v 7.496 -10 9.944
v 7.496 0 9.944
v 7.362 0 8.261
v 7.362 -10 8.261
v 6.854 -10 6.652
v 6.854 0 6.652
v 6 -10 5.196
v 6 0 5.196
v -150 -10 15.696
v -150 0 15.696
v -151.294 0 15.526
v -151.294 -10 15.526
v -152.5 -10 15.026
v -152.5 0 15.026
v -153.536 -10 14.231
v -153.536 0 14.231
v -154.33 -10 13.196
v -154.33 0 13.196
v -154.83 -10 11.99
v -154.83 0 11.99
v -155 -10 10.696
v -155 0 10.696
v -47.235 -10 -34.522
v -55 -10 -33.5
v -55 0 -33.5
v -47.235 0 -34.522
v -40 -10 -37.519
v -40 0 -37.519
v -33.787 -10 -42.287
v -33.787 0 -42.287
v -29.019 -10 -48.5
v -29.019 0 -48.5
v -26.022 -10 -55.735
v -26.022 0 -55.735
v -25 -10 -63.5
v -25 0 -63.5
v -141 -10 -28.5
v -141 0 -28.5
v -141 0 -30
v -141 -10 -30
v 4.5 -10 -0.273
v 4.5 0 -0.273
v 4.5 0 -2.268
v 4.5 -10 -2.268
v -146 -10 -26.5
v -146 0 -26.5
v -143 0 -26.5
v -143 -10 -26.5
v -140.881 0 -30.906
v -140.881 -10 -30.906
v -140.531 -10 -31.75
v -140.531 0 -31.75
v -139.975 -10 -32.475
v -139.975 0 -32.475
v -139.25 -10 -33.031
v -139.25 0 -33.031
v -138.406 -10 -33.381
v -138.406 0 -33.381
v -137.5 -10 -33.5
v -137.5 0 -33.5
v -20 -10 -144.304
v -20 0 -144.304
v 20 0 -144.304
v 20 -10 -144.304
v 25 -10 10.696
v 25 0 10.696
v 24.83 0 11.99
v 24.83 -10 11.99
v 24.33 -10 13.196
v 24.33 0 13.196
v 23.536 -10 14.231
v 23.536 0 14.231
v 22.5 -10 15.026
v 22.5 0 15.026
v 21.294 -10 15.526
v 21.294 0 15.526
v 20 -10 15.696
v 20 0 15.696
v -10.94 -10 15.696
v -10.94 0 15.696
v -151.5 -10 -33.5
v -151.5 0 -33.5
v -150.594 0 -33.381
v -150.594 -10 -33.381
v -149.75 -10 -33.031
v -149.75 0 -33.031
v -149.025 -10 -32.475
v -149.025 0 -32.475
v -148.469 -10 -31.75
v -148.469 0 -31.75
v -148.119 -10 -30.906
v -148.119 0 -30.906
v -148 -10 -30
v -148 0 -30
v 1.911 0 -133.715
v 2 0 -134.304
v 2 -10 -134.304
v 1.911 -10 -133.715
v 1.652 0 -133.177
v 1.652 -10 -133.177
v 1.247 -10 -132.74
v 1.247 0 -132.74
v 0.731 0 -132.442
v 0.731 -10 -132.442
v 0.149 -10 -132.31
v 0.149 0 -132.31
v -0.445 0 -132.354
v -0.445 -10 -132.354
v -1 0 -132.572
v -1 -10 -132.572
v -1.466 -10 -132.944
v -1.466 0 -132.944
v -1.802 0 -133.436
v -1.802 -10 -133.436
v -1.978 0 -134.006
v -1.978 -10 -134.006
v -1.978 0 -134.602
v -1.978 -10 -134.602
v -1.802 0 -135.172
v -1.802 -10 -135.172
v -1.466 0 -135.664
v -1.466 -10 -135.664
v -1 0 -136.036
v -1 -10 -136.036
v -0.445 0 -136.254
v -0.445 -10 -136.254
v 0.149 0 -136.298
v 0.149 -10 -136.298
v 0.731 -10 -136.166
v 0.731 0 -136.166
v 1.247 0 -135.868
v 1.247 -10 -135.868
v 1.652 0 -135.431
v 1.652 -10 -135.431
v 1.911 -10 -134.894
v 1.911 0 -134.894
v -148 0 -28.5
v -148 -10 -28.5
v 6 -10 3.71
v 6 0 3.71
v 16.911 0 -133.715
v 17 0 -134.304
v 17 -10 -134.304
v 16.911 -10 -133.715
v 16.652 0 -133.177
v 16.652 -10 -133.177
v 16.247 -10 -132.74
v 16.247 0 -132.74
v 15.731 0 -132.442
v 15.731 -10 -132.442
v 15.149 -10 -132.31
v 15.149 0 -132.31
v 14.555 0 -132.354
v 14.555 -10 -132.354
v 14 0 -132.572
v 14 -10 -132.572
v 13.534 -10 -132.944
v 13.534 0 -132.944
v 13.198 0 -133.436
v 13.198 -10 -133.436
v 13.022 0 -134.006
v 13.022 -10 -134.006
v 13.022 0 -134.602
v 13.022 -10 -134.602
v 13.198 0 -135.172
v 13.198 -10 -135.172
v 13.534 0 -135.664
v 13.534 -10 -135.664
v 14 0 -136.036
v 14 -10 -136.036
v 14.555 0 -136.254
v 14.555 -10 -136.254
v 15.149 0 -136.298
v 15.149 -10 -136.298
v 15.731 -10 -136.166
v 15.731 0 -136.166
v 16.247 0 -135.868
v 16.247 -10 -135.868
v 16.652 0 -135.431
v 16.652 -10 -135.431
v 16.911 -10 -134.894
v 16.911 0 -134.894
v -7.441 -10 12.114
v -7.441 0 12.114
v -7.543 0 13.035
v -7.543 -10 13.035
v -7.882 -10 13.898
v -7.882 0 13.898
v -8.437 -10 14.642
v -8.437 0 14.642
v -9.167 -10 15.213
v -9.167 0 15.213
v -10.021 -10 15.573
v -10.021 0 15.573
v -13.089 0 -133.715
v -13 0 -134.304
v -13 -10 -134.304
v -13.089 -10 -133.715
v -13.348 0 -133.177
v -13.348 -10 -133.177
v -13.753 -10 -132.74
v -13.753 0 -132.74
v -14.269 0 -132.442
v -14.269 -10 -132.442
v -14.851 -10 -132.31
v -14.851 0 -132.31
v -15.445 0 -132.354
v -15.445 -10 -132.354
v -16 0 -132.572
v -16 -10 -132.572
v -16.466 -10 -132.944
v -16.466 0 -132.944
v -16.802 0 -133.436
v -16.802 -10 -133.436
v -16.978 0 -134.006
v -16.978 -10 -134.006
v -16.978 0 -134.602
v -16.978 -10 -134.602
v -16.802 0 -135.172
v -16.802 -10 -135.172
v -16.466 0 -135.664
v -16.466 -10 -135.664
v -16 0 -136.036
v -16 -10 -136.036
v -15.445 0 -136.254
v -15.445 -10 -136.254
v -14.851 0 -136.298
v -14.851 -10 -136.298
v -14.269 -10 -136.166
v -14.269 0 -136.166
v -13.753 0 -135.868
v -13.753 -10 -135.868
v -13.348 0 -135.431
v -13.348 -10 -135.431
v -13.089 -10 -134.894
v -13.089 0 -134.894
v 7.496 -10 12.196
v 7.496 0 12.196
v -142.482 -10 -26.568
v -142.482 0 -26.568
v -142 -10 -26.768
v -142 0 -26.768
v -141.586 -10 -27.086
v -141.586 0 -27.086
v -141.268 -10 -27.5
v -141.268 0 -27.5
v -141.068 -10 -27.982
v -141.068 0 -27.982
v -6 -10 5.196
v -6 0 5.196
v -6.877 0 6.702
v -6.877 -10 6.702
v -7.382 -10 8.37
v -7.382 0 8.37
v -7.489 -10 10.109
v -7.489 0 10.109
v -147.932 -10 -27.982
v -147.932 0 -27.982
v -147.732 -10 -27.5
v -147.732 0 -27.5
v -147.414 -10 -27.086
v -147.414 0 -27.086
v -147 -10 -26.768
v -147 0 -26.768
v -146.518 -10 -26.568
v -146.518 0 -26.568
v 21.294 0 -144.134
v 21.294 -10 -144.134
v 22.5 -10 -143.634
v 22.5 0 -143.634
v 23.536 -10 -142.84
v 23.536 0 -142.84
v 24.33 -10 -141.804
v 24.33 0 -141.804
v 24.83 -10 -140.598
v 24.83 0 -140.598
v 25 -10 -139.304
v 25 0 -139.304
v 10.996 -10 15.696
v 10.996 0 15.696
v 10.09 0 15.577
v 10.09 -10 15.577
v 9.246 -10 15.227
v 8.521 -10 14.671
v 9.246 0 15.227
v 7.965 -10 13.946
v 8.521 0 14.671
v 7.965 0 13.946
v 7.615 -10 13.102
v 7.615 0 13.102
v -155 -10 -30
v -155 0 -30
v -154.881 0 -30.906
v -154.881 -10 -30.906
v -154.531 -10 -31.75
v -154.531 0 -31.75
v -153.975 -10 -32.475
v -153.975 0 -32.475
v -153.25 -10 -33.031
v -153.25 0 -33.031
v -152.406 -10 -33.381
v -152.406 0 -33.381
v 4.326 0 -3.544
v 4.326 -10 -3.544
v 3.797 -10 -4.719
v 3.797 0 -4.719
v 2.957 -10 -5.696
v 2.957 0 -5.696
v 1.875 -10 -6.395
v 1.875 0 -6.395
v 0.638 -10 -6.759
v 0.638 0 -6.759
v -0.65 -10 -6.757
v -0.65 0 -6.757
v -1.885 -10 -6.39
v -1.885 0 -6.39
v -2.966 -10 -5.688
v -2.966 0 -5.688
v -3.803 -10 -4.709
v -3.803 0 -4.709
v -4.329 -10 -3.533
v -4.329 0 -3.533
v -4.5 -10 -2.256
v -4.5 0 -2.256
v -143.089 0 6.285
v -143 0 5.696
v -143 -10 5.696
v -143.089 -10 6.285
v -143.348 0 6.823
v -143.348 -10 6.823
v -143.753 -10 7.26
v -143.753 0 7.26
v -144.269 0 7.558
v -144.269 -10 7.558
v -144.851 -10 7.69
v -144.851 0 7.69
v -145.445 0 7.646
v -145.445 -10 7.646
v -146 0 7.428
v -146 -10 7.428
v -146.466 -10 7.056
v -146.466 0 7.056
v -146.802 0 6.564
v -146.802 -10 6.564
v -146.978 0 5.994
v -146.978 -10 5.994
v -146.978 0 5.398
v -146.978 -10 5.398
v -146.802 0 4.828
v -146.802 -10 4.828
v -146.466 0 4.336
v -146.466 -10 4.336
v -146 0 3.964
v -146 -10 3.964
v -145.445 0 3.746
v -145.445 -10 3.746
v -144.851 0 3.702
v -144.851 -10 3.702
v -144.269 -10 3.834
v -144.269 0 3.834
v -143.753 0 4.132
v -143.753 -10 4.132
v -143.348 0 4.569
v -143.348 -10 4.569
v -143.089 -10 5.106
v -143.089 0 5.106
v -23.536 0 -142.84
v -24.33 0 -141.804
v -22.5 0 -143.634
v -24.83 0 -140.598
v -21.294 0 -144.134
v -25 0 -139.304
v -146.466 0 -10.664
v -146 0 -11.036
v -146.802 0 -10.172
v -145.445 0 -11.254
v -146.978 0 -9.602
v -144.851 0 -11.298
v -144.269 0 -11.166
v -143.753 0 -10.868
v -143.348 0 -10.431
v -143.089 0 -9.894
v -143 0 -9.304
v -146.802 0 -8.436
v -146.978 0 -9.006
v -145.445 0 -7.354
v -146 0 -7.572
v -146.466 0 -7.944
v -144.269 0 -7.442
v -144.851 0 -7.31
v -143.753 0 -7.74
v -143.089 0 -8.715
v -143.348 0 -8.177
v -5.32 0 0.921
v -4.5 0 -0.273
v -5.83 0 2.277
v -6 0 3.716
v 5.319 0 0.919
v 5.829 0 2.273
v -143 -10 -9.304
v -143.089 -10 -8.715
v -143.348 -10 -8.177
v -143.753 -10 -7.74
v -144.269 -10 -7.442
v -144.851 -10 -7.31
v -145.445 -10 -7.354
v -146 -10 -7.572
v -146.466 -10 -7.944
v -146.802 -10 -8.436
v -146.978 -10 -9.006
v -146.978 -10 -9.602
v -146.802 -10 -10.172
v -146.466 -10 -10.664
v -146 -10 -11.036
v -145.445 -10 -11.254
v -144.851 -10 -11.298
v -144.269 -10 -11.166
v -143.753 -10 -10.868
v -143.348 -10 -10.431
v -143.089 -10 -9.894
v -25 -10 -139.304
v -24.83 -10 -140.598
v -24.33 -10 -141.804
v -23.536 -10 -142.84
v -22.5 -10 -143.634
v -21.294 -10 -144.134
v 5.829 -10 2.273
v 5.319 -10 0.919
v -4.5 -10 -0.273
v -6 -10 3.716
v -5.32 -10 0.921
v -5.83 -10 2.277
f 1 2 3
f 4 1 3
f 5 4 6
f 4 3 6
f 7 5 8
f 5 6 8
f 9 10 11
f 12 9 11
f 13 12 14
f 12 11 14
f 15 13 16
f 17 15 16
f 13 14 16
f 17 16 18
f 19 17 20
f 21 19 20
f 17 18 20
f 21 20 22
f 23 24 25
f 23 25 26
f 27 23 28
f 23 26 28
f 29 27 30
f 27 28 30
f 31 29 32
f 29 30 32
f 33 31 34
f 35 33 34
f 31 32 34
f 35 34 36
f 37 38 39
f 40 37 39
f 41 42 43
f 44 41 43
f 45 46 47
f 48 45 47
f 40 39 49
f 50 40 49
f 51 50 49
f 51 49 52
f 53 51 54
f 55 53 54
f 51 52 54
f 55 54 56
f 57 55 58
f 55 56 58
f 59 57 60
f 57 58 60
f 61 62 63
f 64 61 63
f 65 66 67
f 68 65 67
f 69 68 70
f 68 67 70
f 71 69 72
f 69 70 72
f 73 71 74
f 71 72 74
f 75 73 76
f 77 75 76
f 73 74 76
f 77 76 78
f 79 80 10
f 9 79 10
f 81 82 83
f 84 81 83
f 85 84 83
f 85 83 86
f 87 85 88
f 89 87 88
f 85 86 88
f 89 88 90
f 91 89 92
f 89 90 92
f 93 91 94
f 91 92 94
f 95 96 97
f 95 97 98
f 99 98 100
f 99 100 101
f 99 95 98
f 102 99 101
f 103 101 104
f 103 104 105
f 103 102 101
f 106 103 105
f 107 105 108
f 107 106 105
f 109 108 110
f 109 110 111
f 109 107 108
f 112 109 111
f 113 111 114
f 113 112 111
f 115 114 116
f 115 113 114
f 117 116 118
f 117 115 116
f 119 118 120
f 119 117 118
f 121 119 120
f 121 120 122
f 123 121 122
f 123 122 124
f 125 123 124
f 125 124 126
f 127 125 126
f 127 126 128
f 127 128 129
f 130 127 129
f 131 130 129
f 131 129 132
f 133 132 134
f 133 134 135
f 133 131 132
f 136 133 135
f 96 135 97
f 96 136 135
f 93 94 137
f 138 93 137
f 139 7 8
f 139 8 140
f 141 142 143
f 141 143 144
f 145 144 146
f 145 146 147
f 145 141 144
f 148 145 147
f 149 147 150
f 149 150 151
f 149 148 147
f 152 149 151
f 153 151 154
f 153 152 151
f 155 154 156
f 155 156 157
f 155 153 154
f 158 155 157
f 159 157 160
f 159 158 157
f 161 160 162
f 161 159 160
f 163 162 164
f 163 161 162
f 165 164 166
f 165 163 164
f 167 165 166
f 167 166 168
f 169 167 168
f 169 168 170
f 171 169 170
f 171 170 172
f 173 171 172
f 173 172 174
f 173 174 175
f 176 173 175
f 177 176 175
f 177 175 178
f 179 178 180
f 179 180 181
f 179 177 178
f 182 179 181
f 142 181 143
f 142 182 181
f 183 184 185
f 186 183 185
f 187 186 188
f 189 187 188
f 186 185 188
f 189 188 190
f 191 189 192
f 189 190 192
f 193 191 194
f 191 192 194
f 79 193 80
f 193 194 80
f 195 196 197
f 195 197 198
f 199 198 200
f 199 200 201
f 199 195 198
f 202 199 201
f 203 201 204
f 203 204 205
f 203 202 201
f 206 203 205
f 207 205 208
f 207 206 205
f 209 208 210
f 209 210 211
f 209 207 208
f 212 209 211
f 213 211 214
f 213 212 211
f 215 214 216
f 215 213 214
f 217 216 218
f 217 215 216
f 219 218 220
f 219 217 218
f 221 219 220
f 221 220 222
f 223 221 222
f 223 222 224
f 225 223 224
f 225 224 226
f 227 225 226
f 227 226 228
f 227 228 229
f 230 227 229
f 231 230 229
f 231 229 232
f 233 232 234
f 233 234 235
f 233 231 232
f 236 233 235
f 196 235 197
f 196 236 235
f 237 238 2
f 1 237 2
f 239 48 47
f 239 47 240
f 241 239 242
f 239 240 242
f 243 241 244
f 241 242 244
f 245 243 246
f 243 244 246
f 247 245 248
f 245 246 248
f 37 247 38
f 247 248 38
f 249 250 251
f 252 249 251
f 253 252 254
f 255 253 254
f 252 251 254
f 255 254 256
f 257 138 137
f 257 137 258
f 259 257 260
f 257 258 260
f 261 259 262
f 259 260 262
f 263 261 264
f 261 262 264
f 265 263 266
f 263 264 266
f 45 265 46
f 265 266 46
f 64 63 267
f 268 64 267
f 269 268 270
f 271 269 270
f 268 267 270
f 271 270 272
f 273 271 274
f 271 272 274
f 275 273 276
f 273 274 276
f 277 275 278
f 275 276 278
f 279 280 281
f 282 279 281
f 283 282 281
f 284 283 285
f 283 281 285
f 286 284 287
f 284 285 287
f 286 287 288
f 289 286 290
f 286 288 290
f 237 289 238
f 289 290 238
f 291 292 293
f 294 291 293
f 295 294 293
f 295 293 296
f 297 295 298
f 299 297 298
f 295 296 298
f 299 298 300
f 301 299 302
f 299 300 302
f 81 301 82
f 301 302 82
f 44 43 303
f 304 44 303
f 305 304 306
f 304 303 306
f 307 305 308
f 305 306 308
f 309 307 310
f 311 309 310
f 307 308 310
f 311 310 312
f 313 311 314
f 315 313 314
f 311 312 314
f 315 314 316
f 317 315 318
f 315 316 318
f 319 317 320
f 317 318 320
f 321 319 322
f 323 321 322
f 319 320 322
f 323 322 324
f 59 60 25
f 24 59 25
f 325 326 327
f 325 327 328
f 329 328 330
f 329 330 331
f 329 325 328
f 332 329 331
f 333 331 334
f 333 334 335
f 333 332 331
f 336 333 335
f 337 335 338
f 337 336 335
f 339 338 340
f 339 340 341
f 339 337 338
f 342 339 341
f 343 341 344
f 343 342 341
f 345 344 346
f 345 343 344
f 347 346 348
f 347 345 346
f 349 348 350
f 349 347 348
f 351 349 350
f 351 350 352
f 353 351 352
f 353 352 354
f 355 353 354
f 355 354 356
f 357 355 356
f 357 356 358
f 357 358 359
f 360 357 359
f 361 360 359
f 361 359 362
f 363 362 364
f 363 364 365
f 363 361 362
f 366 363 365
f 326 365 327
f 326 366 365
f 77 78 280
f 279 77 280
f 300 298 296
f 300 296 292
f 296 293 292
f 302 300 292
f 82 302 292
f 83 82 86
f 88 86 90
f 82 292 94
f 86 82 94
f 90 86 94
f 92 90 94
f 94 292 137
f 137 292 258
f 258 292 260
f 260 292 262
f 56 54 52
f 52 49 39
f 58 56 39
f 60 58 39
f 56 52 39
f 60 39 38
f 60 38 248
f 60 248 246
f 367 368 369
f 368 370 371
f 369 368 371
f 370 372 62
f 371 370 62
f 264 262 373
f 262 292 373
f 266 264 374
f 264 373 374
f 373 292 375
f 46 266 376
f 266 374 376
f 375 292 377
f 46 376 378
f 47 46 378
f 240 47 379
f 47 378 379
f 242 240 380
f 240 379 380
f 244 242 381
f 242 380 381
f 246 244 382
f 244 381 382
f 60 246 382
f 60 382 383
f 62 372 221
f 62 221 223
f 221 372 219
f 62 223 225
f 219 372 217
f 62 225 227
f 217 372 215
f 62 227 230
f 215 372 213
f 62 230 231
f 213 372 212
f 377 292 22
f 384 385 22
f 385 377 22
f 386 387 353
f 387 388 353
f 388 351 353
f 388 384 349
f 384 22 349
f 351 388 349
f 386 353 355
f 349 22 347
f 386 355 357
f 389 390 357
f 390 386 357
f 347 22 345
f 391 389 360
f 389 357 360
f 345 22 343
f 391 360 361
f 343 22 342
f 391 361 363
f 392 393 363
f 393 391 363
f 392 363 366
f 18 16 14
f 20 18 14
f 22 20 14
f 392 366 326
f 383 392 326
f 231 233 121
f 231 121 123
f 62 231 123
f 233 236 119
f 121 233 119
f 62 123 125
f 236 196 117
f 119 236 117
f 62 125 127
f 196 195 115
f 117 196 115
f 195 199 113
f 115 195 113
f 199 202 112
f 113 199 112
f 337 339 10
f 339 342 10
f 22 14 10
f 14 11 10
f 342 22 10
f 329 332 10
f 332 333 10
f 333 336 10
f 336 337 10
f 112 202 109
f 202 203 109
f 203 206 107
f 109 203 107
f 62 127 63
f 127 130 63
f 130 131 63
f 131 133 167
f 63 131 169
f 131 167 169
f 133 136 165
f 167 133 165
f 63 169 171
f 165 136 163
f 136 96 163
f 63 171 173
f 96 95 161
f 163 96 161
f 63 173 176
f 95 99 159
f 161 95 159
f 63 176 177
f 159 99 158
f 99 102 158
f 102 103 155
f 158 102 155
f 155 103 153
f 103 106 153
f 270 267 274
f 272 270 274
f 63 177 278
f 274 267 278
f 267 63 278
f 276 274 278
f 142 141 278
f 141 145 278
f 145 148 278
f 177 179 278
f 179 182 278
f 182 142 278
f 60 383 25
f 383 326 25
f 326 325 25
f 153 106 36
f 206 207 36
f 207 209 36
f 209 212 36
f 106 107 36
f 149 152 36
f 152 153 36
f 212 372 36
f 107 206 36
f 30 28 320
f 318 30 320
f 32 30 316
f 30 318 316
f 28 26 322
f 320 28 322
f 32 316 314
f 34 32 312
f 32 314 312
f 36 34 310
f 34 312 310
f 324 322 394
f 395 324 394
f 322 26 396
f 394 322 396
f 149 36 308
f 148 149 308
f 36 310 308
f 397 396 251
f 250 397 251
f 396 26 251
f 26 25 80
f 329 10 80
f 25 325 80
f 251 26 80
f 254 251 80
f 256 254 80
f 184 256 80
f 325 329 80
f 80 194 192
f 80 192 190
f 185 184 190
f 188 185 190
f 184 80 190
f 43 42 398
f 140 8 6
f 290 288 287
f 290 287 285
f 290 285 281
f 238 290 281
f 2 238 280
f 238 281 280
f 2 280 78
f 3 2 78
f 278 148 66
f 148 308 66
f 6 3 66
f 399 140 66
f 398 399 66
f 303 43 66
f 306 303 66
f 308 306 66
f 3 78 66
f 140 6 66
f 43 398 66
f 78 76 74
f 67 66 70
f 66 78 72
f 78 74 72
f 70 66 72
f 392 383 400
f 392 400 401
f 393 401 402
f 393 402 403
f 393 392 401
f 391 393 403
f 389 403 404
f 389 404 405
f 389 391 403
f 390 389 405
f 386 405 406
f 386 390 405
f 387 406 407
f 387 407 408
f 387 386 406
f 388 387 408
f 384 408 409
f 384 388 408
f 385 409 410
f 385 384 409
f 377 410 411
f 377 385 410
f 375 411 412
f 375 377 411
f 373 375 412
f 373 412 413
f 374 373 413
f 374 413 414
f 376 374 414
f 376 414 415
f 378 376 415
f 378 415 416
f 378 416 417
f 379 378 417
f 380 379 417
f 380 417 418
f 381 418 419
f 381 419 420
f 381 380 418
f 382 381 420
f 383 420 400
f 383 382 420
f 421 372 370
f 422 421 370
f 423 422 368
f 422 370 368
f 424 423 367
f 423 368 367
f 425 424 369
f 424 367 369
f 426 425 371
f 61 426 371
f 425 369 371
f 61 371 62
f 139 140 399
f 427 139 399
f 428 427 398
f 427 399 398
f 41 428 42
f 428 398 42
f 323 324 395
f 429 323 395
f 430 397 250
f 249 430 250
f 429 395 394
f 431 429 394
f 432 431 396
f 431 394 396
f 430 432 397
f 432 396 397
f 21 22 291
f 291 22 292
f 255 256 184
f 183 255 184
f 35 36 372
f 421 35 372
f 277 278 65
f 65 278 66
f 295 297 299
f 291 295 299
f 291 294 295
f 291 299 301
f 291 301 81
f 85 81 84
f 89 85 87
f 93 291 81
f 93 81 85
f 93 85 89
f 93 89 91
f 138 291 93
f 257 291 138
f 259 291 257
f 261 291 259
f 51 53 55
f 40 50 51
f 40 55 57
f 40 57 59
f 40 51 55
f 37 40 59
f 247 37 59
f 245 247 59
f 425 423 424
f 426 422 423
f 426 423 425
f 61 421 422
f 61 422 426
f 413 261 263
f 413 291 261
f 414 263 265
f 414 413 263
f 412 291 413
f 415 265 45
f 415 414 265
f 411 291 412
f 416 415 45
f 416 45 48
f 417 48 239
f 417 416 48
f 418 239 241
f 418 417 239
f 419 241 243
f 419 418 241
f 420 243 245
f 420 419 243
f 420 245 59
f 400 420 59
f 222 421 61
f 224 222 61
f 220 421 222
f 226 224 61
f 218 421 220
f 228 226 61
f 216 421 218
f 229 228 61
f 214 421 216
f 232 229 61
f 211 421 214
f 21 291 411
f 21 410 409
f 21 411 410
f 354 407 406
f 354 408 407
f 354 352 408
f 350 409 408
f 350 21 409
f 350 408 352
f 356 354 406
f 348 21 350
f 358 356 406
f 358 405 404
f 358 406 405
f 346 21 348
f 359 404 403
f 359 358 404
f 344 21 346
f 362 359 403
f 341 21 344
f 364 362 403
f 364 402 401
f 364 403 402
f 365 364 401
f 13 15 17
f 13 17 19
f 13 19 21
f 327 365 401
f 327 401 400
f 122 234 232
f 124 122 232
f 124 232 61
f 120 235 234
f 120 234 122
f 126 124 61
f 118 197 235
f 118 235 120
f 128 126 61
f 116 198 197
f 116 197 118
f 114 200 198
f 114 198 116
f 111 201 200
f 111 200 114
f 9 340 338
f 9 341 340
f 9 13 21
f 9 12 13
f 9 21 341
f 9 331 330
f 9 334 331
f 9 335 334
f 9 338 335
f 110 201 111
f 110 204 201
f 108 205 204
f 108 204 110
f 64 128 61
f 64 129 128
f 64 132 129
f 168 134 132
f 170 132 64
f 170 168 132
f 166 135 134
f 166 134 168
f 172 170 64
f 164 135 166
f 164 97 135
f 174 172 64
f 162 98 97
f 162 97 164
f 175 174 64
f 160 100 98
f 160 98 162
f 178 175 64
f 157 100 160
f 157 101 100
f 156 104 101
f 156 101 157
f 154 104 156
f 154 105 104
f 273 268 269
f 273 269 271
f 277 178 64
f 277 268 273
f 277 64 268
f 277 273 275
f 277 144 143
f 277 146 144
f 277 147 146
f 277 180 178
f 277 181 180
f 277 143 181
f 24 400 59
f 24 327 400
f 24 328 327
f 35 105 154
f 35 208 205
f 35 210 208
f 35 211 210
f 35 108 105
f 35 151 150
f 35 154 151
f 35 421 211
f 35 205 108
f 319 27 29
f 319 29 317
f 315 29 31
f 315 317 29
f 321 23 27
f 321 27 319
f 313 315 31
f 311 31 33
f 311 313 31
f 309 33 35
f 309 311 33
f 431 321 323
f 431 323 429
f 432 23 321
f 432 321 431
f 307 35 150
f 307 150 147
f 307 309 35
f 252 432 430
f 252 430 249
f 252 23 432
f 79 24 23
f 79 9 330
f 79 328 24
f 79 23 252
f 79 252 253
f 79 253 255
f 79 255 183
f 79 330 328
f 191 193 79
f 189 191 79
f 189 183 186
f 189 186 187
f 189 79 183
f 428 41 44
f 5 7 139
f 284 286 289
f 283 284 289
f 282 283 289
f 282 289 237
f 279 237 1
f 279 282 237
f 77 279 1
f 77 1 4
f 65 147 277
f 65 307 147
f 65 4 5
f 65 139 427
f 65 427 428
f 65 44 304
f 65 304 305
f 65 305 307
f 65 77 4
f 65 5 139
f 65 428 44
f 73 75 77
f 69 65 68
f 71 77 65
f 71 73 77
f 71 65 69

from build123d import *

# Parameters (mm, degrees)
F0_R     = 2
F1_DEPTH = 10


with BuildPart() as f1:
    # F0 (on Front) → F1 (new body)
    with BuildSketch(Plane.XZ):
        with BuildLine():
            ThreePointArc((-141, -30), (-139.974874, -32.474874), (-137.5, -33.5))
            Line((-137.5, -33.5), (-55, -33.5))
            ThreePointArc((-55, -33.5), (-33.786797, -42.286797), (-25, -63.5))
            Line((-25, -63.5), (-25, -139.304042))
            ThreePointArc((-25, -139.304042), (-23.535534, -142.839575), (-20, -144.304042))
            Line((-20, -144.304042), (20, -144.304042))
            ThreePointArc((20, -144.304042), (23.535534, -142.839575), (25, -139.304042))
            Line((25, -139.304042), (25, 10.695958))
            ThreePointArc((25, 10.695958), (23.535534, 14.231492), (20, 15.695958))
            Line((20, 15.695958), (10.995904, 15.695958))
            ThreePointArc((10.995904, 15.695958), (8.52103, 14.670832), (7.495904, 12.195958))
            Line((7.495904, 12.195958), (7.495904, 9.943808))
            ThreePointArc((7.495904, 9.943808), (7.153343, 7.442143), (5.999985, 5.195938))
            Line((5.999985, 5.195938), (5.999985, 3.709538))
            ThreePointArc((5.999985, 3.709538), (5.614844, 1.580886), (4.499852, -0.272836))
            Line((4.499852, -0.272836), (4.499852, -2.267552))
            ThreePointArc((4.499852, -2.267552), (-0.005832, -6.804038), (-4.499742, -2.255887))
            Line((-4.499742, -2.255887), (-4.499742, -0.272961))
            ThreePointArc((-4.499742, -0.272961), (-5.616003, 1.583966), (-5.999966, 3.716286))
            Line((-5.999966, 3.716286), (-5.999966, 5.195912))
            ThreePointArc((-5.999966, 5.195912), (-7.177791, 7.521258), (-7.488602, 10.109288))
            Line((-7.488602, 10.109288), (-7.441414, 12.113578))
            ThreePointArc((-7.441414, 12.113578), (-8.436614, 14.641533), (-10.940444, 15.695958))
            Line((-10.940444, 15.695958), (-150, 15.695958))
            ThreePointArc((-150, 15.695958), (-153.535534, 14.231492), (-155, 10.695958))
            Line((-155, 10.695958), (-155, -30))
            ThreePointArc((-155, -30), (-153.974874, -32.474874), (-151.5, -33.5))
            ThreePointArc((-151.5, -33.5), (-149.025126, -32.474874), (-148, -30))
            Line((-148, -30), (-148, -28.5))
            ThreePointArc((-148, -28.5), (-147.414214, -27.085787), (-146, -26.5))
            Line((-146, -26.5), (-143, -26.5))
            ThreePointArc((-143, -26.5), (-141.585786, -27.085787), (-141, -28.5))
            Line((-141, -28.5), (-141, -30))
        make_face()
        with Locations((-15, -134.304042)):
            Circle(F0_R, mode=Mode.SUBTRACT)
        with Locations((0, -134.304042)):
            Circle(F0_R, mode=Mode.SUBTRACT)
        with Locations((15, -134.304042)):
            Circle(F0_R, mode=Mode.SUBTRACT)
        with Locations((-145, -9.304042)):
            Circle(F0_R, mode=Mode.SUBTRACT)
        with Locations((-145, 5.695958)):
            Circle(F0_R, mode=Mode.SUBTRACT)
    extrude(amount=F1_DEPTH)


solid = f1.part
